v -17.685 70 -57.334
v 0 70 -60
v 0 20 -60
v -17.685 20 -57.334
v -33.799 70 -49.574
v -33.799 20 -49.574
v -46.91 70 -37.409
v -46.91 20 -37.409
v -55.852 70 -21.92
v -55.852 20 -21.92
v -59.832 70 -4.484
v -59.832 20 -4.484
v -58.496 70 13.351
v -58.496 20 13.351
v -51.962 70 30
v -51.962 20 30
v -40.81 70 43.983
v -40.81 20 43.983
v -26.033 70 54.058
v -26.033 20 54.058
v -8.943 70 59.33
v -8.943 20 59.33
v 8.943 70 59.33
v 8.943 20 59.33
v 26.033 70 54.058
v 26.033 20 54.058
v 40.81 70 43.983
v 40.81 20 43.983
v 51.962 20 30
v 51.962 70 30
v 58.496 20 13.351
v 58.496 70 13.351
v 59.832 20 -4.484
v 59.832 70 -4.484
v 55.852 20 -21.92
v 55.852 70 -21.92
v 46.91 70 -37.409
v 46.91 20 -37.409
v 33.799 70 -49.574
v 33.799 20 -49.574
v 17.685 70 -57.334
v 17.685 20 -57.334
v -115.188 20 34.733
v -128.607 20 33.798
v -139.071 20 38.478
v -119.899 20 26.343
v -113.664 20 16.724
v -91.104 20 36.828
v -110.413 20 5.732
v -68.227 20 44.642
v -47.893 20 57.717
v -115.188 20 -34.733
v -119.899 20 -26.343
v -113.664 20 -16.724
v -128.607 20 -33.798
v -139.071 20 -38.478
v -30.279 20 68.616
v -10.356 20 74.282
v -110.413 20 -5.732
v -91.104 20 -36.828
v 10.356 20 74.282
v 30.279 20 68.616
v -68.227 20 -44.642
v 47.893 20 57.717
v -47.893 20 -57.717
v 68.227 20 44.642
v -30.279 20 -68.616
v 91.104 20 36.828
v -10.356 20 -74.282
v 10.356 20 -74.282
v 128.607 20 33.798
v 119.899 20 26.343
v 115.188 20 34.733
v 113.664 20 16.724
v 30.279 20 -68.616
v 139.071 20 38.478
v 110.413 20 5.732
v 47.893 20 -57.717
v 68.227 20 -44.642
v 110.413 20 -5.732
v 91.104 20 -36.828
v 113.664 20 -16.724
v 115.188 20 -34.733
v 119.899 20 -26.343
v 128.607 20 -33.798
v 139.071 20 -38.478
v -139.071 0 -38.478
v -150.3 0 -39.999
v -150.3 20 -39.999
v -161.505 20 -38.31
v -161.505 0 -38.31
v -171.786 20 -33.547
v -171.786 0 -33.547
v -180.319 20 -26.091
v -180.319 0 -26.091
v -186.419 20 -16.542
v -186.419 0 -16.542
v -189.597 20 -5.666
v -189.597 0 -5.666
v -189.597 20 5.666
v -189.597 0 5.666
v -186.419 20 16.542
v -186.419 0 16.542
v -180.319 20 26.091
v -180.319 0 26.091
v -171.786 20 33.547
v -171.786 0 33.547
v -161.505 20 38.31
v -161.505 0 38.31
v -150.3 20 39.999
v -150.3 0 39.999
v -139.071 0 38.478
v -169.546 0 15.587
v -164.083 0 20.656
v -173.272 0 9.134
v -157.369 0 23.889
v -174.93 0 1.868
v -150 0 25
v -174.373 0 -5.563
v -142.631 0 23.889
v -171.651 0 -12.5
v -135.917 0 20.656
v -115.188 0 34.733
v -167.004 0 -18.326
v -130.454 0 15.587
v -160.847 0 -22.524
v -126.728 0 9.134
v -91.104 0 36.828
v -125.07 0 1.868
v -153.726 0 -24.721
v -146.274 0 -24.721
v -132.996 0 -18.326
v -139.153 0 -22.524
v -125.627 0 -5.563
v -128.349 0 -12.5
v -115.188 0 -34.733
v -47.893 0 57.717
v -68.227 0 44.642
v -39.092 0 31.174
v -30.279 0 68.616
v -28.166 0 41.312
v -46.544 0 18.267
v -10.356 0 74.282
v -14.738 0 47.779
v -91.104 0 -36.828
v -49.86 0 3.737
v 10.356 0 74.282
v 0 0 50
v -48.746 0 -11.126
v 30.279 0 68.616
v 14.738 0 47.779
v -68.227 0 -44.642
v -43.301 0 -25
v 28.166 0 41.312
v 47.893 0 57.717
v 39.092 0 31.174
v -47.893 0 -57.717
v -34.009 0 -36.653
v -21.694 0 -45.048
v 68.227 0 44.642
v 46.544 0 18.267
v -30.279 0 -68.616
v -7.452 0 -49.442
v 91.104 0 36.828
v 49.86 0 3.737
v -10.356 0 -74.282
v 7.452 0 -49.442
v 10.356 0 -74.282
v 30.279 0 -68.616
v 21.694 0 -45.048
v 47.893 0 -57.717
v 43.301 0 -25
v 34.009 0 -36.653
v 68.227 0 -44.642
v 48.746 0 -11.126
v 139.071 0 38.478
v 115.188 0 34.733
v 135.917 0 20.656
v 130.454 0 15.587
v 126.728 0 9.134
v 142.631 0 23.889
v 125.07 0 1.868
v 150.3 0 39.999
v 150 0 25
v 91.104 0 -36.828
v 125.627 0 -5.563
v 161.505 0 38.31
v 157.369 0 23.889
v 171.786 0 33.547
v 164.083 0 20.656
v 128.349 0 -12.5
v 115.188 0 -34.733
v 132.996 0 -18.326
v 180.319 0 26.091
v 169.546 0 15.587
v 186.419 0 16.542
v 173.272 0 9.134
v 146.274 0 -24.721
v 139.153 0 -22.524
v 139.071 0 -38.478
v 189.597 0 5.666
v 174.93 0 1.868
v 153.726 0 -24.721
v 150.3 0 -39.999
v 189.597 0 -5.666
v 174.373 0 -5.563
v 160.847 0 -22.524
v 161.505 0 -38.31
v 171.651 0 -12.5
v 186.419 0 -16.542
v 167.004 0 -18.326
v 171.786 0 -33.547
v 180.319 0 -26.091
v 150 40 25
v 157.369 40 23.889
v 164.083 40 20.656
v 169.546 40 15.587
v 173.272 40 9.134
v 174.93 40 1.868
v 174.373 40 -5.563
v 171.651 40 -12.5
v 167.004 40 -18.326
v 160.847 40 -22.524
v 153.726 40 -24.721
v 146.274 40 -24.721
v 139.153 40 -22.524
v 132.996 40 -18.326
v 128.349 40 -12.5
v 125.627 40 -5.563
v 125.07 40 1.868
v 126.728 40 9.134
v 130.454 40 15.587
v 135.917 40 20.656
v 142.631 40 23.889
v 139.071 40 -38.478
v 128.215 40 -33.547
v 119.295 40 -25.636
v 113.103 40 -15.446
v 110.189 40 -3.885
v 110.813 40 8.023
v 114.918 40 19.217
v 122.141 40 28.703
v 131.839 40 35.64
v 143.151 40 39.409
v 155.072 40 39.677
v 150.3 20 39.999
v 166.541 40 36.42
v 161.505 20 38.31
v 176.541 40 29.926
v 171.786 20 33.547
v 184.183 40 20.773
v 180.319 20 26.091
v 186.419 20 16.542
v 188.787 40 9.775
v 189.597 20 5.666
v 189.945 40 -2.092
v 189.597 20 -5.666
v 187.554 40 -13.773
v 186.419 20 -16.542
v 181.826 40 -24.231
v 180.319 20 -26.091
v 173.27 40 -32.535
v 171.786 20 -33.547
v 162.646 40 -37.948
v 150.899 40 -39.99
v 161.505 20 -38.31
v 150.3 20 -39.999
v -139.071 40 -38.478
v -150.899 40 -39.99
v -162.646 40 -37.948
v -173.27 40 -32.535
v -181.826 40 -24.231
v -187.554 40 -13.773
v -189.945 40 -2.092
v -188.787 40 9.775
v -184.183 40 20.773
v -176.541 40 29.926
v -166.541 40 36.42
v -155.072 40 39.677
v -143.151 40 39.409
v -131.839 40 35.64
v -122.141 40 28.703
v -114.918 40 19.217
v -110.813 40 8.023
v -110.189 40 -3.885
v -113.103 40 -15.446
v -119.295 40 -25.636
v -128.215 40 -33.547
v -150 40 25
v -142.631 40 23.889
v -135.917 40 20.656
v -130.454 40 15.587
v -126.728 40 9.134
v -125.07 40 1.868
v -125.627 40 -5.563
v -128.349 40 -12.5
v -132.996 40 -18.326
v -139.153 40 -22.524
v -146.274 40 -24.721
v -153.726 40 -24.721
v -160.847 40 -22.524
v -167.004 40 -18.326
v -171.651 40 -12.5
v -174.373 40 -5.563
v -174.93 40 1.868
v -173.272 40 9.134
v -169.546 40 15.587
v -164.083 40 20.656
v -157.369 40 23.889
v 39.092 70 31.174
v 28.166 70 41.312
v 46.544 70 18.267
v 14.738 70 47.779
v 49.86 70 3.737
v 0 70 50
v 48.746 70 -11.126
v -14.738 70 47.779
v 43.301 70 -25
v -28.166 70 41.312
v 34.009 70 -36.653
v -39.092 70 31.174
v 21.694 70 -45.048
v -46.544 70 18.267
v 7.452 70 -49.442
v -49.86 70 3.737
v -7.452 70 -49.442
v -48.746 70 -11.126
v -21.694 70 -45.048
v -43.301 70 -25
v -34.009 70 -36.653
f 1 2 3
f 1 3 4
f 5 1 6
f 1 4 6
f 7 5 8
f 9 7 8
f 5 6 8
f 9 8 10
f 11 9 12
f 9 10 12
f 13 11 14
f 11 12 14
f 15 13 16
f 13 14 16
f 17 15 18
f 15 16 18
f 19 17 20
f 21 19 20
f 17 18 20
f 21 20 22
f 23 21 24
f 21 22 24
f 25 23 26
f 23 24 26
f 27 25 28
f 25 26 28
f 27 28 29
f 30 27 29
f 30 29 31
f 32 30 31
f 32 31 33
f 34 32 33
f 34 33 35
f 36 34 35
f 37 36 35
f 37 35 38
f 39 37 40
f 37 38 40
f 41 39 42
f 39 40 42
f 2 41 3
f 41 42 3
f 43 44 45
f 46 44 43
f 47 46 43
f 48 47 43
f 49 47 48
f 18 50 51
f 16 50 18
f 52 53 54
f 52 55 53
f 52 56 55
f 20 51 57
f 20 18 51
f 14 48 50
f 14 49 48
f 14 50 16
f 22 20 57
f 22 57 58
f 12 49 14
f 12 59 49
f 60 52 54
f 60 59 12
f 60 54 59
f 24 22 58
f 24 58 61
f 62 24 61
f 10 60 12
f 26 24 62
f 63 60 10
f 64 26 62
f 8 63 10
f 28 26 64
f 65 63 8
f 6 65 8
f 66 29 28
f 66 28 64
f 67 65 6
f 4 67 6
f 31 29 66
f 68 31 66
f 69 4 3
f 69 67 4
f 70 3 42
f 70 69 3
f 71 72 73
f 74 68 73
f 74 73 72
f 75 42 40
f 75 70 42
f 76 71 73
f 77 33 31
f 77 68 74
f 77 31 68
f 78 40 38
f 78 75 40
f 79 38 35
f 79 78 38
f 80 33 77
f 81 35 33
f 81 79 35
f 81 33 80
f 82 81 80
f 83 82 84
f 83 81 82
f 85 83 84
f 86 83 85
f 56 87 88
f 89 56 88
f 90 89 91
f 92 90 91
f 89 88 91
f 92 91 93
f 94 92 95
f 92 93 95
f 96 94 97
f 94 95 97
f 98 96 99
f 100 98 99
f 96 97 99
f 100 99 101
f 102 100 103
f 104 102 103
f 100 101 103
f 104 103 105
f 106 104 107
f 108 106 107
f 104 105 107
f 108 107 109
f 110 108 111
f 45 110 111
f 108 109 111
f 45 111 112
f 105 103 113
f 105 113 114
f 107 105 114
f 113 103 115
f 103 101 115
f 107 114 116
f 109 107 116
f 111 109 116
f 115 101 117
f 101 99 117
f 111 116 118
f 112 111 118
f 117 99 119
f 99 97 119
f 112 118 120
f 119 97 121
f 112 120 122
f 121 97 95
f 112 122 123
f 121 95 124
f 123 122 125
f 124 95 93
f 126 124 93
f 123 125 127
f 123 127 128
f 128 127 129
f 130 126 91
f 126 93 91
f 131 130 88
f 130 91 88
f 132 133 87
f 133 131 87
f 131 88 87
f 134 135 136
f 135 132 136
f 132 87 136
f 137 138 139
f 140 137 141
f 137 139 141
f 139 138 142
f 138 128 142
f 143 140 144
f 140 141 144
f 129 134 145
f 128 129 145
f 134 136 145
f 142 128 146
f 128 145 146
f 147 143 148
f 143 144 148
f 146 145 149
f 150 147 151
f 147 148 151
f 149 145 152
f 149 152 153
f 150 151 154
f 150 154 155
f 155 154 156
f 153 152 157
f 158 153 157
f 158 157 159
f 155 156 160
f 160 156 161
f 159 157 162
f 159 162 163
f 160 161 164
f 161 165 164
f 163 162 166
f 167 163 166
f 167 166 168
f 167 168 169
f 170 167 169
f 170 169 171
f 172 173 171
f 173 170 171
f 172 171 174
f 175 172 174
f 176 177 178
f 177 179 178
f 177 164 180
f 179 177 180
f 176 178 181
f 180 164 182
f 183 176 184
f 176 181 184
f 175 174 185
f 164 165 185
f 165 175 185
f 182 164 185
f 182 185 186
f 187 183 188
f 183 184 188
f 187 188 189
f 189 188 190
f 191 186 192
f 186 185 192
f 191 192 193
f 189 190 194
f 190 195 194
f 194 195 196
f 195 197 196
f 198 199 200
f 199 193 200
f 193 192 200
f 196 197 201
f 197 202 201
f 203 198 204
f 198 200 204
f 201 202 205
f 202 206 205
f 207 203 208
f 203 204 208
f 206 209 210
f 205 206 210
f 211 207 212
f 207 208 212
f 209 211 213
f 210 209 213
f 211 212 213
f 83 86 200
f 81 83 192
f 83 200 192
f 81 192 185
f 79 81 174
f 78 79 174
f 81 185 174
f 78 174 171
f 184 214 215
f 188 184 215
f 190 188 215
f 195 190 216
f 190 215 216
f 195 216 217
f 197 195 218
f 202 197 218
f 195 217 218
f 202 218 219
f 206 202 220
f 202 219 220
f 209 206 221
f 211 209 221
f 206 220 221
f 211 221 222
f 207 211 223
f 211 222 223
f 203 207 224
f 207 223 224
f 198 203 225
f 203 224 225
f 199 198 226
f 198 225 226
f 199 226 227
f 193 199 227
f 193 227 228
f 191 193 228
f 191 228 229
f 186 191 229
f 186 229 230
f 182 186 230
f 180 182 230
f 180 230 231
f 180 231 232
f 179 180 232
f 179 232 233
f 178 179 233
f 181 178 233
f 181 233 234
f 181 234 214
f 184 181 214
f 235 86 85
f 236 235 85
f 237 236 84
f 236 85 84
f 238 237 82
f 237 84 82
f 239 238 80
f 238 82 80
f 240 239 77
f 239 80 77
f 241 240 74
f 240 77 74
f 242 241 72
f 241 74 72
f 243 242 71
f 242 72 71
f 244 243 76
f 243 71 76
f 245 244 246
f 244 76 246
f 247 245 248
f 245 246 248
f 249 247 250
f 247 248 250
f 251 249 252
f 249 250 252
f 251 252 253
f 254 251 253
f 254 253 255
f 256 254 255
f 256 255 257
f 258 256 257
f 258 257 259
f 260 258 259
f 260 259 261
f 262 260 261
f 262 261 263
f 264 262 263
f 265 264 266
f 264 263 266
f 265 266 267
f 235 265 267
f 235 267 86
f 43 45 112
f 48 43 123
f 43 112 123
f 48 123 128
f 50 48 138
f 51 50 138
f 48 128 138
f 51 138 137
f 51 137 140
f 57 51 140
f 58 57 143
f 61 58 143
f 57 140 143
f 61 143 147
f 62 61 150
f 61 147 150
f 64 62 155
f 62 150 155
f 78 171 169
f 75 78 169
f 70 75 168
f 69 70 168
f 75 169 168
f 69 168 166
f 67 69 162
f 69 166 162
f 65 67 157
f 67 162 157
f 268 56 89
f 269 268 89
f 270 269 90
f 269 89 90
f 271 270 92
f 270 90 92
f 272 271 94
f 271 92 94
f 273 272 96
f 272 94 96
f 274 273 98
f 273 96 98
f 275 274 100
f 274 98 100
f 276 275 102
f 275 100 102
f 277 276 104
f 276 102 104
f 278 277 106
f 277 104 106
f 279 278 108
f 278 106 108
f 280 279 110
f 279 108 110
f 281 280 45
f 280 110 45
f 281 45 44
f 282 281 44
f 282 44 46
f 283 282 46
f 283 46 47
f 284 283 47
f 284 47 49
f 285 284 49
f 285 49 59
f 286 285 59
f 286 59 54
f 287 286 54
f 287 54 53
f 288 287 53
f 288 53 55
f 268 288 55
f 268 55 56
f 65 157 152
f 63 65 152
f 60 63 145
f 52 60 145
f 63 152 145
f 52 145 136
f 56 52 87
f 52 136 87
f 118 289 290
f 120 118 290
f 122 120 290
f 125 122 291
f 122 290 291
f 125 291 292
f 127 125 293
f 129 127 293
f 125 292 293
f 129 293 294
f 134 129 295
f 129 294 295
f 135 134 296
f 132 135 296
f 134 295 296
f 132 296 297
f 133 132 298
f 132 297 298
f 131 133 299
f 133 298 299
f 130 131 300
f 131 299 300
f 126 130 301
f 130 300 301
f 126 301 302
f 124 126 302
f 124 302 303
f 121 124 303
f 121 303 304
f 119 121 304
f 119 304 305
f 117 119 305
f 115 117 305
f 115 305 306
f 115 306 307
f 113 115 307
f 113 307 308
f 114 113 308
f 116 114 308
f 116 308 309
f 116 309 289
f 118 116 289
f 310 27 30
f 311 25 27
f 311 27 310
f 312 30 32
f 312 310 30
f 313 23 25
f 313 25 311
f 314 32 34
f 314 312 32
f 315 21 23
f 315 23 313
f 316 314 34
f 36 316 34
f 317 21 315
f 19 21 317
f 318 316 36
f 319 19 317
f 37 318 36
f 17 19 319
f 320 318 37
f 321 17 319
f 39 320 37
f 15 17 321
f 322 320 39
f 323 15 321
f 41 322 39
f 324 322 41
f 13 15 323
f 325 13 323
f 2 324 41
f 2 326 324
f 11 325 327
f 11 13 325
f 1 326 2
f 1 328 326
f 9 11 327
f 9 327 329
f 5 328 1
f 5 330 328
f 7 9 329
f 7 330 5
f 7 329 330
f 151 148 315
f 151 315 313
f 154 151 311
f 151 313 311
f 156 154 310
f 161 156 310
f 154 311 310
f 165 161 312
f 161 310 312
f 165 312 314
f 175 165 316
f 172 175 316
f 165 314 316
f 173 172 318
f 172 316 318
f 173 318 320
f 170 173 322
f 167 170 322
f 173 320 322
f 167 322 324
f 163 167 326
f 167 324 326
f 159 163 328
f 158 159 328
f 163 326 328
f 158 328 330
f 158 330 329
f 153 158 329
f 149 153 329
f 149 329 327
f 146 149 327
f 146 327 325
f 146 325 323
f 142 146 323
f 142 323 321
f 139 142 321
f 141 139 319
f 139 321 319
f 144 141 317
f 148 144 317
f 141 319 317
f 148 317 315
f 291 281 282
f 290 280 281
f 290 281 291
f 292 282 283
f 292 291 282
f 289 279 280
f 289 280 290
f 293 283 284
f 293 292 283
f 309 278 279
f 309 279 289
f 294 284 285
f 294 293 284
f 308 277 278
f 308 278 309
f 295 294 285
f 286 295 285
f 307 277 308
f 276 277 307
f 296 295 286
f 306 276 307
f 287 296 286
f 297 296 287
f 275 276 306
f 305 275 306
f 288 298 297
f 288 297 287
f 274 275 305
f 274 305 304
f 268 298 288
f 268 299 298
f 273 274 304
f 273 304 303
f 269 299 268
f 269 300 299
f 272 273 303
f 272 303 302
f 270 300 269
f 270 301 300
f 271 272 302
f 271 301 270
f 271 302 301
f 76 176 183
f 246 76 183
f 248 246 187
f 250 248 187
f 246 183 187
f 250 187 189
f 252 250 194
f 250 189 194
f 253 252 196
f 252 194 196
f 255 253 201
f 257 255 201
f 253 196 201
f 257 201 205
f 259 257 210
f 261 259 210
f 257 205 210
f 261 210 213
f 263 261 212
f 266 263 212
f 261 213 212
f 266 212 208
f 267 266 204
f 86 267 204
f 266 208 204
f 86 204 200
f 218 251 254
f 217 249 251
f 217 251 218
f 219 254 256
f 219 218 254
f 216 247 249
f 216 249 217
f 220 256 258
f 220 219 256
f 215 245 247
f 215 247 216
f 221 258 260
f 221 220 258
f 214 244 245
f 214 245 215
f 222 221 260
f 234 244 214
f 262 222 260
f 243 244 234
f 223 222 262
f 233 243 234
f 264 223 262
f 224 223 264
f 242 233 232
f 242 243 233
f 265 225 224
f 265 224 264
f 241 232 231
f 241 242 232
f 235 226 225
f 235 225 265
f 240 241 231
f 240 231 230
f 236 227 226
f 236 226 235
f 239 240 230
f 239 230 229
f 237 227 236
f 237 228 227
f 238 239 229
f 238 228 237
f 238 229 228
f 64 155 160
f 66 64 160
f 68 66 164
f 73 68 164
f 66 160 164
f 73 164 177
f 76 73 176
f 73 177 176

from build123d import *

# Parameters (mm, degrees)
BOSS_EXTRUDE1_DEPTH = 20
SKETCH2_R           = 60
BOSS_EXTRUDE2_DEPTH = 50
SKETCH3_R           = 40
BOSS_EXTRUDE3_DEPTH = 20
SKETCH4_R           = 50
SKETCH4_R_2         = 25
CUT_EXTRUDE1_DEPTH  = 70


with BuildPart() as part:
    # Sketch1 → Boss-Extrude1 (new body)
    with BuildSketch(Plane(origin=(0, 0, 0), x_dir=(1, 0, 0), z_dir=(0, 1, 0))):
        with BuildLine():
            ThreePointArc((-47.892857143, -57.717191847), (0, -75), (47.892857143, -57.717191847))
            ThreePointArc((47.892857143, -57.717191847), (91.104177178, -36.827906099), (139.071428571, -38.478127898))
            ThreePointArc((139.071428571, -38.478127898), (190, 0), (139.071428571, 38.478127898))
            ThreePointArc((139.071428571, 38.478127898), (91.104177178, 36.827906099), (47.892857143, 57.717191847))
            ThreePointArc((47.892857143, 57.717191847), (0, 75), (-47.892857143, 57.717191847))
            ThreePointArc((-47.892857143, 57.717191847), (-91.104177178, 36.827906099), (-139.071428571, 38.478127898))
            ThreePointArc((-139.071428571, 38.478127898), (-190, 0), (-139.071428571, -38.478127898))
            ThreePointArc((-139.071428571, -38.478127898), (-91.104177178, -36.827906099), (-47.892857143, -57.717191847))
        make_face()
    extrude(amount=BOSS_EXTRUDE1_DEPTH)

    # Sketch2 → Boss-Extrude2 (add)
    with BuildSketch(Plane(origin=(0, 20, 0), x_dir=(1, 0, 0), z_dir=(0, 1, 0))):
        with Locations(Location((0, 0, 0), (0, 0, 90))):
            Circle(SKETCH2_R)
    extrude(amount=BOSS_EXTRUDE2_DEPTH)

    # Sketch3 → Boss-Extrude3 (add)
    with BuildSketch(Plane(origin=(0, 20, 0), x_dir=(1, 0, 0), z_dir=(0, 1, 0))):
        with Locations(Location((-150, 0, 0), (0, 0, 74.144374523))):
            Circle(SKETCH3_R)
        with Locations(Location((150, 0, 0), (0, 0, 105.855625477))):
            Circle(SKETCH3_R)
    extrude(amount=BOSS_EXTRUDE3_DEPTH)

    # Sketch4 → Cut-Extrude1 (cut)
    with BuildSketch(Plane(origin=(0, 70, 0), x_dir=(1, 0, 0), z_dir=(0, 1, 0))):
        with Locations(Location((0, 0, 0), (0, 0, 270))):
            Circle(SKETCH4_R)
        with Locations(Location((-150, 0, 0), (0, 0, 270))):
            Circle(SKETCH4_R_2)
        with Locations(Location((150, 0, 0), (0, 0, 270))):
            Circle(SKETCH4_R_2)
    extrude(amount=-CUT_EXTRUDE1_DEPTH, mode=Mode.SUBTRACT)


solid = part.part
